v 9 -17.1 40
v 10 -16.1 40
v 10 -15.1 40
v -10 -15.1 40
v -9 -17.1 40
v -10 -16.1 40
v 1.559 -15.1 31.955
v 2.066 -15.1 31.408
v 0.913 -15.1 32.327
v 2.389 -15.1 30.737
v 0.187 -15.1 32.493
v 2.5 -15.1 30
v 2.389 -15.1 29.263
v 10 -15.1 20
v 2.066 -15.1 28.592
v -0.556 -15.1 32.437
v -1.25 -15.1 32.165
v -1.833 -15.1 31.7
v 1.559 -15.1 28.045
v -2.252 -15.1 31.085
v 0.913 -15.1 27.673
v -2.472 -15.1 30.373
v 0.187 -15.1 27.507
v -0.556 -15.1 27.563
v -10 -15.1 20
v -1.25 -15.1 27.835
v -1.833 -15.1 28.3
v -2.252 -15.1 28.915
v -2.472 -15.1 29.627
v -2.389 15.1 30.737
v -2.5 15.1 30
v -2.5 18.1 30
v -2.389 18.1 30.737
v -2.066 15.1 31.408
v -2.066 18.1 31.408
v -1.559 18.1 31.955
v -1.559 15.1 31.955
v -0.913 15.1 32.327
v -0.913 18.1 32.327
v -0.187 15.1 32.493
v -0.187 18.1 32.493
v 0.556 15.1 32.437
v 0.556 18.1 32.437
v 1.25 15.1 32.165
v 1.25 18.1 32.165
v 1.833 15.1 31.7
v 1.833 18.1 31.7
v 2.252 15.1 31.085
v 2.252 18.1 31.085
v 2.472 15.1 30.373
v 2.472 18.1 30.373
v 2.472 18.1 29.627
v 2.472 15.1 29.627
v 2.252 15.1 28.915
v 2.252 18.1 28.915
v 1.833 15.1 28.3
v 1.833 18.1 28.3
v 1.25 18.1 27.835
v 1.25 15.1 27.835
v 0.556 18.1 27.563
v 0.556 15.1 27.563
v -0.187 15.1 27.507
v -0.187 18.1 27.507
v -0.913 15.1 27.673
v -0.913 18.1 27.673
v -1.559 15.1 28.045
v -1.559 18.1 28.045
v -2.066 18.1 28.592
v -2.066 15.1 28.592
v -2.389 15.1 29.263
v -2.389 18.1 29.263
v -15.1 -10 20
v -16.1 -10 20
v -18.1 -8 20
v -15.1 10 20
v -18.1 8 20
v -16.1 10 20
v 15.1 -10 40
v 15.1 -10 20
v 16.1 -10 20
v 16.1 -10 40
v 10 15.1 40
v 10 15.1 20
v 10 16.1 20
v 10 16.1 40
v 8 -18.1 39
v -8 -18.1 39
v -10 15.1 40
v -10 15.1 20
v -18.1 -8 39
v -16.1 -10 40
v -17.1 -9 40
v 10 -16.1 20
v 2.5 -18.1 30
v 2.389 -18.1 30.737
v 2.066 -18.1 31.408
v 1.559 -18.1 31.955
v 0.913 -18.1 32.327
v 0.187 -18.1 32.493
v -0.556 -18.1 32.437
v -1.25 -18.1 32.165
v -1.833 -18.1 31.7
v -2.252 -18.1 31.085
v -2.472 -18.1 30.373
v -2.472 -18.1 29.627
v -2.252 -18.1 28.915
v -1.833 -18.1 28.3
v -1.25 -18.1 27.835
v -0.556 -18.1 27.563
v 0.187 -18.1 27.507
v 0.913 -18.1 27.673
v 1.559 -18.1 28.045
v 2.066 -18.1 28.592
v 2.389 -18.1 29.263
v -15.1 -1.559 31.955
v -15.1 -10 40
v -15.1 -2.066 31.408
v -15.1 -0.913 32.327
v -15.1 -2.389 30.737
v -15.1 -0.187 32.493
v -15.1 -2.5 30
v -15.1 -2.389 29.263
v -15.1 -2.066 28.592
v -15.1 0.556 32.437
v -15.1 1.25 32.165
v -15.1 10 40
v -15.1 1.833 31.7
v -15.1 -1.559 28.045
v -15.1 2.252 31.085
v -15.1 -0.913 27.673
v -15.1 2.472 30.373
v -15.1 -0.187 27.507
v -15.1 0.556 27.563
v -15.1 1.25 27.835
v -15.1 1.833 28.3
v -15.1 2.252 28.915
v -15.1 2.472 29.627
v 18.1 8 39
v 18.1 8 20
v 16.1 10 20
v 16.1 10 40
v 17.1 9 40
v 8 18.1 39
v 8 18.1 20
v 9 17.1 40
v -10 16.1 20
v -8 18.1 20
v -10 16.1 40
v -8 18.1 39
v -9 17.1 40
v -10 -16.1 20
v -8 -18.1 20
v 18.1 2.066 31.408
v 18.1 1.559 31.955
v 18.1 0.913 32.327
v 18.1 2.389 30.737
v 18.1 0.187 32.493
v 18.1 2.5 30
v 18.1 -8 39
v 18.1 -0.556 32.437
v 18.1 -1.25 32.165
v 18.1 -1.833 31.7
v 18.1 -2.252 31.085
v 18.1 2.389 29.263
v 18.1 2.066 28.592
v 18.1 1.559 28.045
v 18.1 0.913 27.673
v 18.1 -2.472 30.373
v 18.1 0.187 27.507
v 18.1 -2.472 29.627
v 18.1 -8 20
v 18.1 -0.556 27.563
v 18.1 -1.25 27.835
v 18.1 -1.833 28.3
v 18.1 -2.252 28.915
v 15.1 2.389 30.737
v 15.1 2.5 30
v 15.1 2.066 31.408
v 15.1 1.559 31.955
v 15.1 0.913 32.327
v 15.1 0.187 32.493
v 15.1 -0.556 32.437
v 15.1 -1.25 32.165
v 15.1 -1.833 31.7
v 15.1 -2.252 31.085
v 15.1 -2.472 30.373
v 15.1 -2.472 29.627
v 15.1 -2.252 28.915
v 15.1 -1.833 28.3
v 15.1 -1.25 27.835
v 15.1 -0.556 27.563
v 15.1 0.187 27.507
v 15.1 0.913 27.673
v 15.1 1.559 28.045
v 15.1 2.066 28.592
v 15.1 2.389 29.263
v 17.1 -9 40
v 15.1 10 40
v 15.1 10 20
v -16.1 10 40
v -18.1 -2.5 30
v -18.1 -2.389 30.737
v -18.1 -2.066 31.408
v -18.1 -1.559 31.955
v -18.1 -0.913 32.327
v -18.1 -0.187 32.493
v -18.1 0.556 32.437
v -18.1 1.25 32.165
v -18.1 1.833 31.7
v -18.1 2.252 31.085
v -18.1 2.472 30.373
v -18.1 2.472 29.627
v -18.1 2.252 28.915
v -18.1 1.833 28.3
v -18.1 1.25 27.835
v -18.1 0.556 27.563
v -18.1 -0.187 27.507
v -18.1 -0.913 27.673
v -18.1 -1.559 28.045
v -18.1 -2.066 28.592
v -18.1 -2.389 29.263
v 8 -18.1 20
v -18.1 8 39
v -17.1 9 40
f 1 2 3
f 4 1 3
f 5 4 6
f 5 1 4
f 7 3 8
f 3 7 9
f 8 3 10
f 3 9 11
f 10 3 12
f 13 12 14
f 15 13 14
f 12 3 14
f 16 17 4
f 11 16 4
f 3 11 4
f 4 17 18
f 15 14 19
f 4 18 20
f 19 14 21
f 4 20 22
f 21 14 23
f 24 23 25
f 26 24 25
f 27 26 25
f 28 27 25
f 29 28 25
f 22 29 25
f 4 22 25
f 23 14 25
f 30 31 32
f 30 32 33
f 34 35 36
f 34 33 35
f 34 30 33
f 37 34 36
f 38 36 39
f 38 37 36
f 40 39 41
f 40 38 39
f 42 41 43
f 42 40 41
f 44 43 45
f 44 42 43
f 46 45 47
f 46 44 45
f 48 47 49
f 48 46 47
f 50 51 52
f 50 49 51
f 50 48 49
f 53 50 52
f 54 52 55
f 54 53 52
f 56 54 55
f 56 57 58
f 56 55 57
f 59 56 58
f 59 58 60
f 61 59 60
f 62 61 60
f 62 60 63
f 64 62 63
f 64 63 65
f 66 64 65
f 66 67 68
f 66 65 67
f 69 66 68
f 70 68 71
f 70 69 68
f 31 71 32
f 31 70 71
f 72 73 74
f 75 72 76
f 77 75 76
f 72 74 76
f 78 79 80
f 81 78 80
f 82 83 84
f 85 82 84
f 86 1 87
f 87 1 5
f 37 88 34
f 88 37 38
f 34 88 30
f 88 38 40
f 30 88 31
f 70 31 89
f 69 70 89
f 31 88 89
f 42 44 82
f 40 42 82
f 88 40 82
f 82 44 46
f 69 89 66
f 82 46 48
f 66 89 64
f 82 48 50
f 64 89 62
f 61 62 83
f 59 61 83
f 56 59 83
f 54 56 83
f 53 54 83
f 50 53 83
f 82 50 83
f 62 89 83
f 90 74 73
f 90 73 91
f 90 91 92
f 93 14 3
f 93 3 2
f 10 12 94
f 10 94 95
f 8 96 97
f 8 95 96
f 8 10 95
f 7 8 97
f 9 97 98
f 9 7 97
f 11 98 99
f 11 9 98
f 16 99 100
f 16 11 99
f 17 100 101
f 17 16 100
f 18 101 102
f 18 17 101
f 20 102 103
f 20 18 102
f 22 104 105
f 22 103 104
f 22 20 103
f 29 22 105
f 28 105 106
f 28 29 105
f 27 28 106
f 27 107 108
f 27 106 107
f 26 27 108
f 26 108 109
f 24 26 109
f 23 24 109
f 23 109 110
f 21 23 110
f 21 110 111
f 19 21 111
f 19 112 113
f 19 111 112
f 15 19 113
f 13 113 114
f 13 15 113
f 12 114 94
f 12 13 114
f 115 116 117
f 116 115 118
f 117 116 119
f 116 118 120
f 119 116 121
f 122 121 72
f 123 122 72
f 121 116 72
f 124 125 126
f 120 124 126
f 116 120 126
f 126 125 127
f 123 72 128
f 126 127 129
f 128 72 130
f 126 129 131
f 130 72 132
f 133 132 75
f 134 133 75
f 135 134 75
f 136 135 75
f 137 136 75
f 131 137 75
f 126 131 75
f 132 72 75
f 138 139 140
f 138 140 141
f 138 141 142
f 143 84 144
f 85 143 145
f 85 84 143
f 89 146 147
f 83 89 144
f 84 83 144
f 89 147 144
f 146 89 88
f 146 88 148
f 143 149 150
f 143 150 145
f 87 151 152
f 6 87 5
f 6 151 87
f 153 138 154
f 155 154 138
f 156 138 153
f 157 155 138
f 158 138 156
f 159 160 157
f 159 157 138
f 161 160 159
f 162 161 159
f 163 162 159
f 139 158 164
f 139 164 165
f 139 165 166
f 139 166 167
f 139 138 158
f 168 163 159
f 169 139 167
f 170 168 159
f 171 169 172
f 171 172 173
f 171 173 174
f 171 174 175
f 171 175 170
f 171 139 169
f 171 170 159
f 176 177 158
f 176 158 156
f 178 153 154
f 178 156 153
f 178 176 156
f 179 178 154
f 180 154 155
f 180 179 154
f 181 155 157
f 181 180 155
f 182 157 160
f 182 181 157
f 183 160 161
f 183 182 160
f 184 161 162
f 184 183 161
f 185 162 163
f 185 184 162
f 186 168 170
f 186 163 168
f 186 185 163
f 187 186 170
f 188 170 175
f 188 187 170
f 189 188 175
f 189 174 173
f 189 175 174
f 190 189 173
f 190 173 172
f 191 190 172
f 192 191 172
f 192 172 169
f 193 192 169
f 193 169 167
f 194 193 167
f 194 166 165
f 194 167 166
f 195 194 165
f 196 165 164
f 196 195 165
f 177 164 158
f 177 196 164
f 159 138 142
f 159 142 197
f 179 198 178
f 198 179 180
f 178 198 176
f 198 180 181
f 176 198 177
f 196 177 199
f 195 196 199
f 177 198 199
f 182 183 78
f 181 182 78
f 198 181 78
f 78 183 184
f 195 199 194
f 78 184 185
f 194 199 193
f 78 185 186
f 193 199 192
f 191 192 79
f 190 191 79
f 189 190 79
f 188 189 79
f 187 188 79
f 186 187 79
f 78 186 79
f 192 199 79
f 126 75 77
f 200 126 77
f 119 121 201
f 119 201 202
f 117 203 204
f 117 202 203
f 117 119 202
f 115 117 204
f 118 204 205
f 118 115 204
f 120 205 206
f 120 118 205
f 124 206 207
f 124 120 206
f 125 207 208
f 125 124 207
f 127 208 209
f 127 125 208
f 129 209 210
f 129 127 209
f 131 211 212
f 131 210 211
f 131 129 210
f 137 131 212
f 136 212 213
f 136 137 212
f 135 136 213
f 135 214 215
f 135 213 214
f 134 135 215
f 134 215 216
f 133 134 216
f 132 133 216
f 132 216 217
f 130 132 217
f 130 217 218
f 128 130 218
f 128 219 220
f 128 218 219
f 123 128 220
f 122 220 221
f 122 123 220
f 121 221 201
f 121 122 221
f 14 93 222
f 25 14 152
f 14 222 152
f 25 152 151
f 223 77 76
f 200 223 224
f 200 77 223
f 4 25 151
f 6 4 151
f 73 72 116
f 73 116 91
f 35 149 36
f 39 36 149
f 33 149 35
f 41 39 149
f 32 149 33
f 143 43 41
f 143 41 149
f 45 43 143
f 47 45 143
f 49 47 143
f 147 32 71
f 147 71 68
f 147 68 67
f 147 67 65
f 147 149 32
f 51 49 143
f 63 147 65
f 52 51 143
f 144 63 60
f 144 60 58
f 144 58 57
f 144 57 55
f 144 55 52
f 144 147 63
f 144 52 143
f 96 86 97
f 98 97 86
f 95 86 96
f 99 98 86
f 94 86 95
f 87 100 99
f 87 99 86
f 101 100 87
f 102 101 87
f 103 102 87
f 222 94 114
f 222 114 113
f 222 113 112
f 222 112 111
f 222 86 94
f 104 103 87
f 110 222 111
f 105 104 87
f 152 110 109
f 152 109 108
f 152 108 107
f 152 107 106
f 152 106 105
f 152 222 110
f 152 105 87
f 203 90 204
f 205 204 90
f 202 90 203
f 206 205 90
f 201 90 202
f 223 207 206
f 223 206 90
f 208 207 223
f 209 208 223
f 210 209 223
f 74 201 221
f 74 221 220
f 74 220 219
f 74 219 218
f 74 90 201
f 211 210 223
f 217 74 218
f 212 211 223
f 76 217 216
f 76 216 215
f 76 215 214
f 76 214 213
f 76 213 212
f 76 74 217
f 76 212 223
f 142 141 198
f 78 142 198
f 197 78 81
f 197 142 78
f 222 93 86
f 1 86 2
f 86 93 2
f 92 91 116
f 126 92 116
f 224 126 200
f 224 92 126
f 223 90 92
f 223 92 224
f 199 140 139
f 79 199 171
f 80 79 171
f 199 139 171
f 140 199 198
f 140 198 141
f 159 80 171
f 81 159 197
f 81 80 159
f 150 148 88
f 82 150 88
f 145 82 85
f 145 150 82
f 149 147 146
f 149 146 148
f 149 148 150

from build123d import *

# Parameters (mm, degrees)
CYLINDER002_R               = 2.5
CYLINDER002_DEPTH           = 10
CYLINDER003_R               = 2.5
CYLINDER003_DEPTH           = 10
CYLINDER003_ROLL_ANGLE      = 90
CYLINDER003_PLACEMENT_ANGLE = 180
CYLINDER004_R               = 2.5
CYLINDER004_DEPTH           = 10
CYLINDER004_ROLL_ANGLE      = 90
CYLINDER004_PITCH_ANGLE     = 0
CYLINDER004_PLACEMENT_ANGLE = -90
CYLINDER001_R               = 2.5
CYLINDER001_DEPTH           = 10
BOX002_W                    = 20
BOX002_H                    = 3
BOX002_DEPTH                = 20
BOX003_W                    = 20
BOX003_H                    = 3
BOX003_DEPTH                = 20
BOX004_W                    = 20
BOX004_H                    = 3
BOX004_DEPTH                = 20
BOX001_W                    = 20
BOX001_H                    = 3
BOX001_DEPTH                = 20
CHAMFER002_SIZE             = 2
CHAMFER003_SIZE             = 2
CHAMFER004_SIZE             = 1


with BuildPart() as v_lec002:
    # Cylinder002 → Cylinder002 (new body)
    with BuildSketch(Plane(origin=(12, 0, 30), x_dir=(0, 1, 0), z_dir=(1, 0, 0))):
        Circle(CYLINDER002_R)
    extrude(amount=CYLINDER002_DEPTH)


with BuildPart() as v_lec003:
    # Cylinder003 → Cylinder003 (new body)
    with BuildSketch(Plane.XY):
        Circle(CYLINDER003_R)
    extrude(amount=CYLINDER003_DEPTH)


with BuildPart() as v_lec003_1:
    # Cylinder003 roll: moved
    add(v_lec003.part.rotate(Axis((0, 0, 0), (1, 0, 0)), CYLINDER003_ROLL_ANGLE))


with BuildPart() as v_lec003_2:
    # Cylinder003 placement: moved
    add(v_lec003_1.part.moved(Location((0, 12, 30))).rotate(Axis((0, 12, 30), (0, 0, 1)), CYLINDER003_PLACEMENT_ANGLE))


with BuildPart() as v_lec004:
    # Cylinder004 → Cylinder004 (new body)
    with BuildSketch(Plane.XY):
        Circle(CYLINDER004_R)
    extrude(amount=CYLINDER004_DEPTH)


with BuildPart() as v_lec004_1:
    # Cylinder004 roll: moved
    add(v_lec004.part.rotate(Axis((0, 0, 0), (1, 0, 0)), CYLINDER004_ROLL_ANGLE))


with BuildPart() as v_lec004_2:
    # Cylinder004 pitch: moved
    add(v_lec004_1.part.rotate(Axis((0, 0, 0), (0, 1, 0)), CYLINDER004_PITCH_ANGLE))


with BuildPart() as v_lec004_3:
    # Cylinder004 placement: moved
    add(v_lec004_2.part.moved(Location((-12, 0, 30))).rotate(Axis((-12, 0, 30), (0, 0, 1)), CYLINDER004_PLACEMENT_ANGLE))


with BuildPart() as compound001:
    # Cylinder001 → Cylinder001 (new body)
    with BuildSketch(Plane(origin=(0, -12, 30), x_dir=(1, 0, 0), z_dir=(0, -1, 0))):
        Circle(CYLINDER001_R)
    extrude(amount=CYLINDER001_DEPTH)

    # Compound001: union Válec002, Válec003, Válec004
    add(v_lec002.part)
    add(v_lec003_2.part)
    add(v_lec004_3.part)


with BuildPart() as krychle002:
    # Box002 → Box002 (new body)
    with BuildSketch(Plane(origin=(-15.1, -10, 20), x_dir=(0, 1, 0), z_dir=(0, 0, 1))):
        with Locations((10, 1.5)):
            Rectangle(BOX002_W, BOX002_H)
    extrude(amount=BOX002_DEPTH)


with BuildPart() as krychle003:
    # Box003 → Box003 (new body)
    with BuildSketch(Plane(origin=(10, -15.1, 20), x_dir=(-1, 0, 0), z_dir=(0, 0, 1))):
        with Locations((10, 1.5)):
            Rectangle(BOX003_W, BOX003_H)
    extrude(amount=BOX003_DEPTH)


with BuildPart() as krychle004:
    # Box004 → Box004 (new body)
    with BuildSketch(Plane(origin=(15.1, 10, 20), x_dir=(0, -1, 0), z_dir=(0, 0, 1))):
        with Locations((10, 1.5)):
            Rectangle(BOX004_W, BOX004_H)
    extrude(amount=BOX004_DEPTH)


with BuildPart() as chamfer004:
    # Box001 → Box001 (new body)
    with BuildSketch(Plane(origin=(-10, 15.1, 20), x_dir=(1, 0, 0), z_dir=(0, 0, 1))):
        with Locations((10, 1.5)):
            Rectangle(BOX001_W, BOX001_H)
    extrude(amount=BOX001_DEPTH)

    # Compound725: union Krychle002, Krychle003, Krychle004
    add(krychle002.part)
    add(krychle003.part)
    add(krychle004.part)

    # Cut001: cut Compound001
    add(compound001.part, mode=Mode.SUBTRACT)

    # Chamfer002
    chamfer002_edges = [chamfer004.edges().sort_by_distance(p)[0] for p in [
        (-10, 18.1, 30),
        (10, 18.1, 30),
        (-18.1, -10, 30),
        (-18.1, 10, 30),
        (-10, -18.1, 30),
    ]]
    chamfer(chamfer002_edges, length=CHAMFER002_SIZE)

    # Chamfer003
    chamfer003_edges = [chamfer004.edges().sort_by_distance(p)[0] for p in [
        (10, -18.1, 30),
        (18.1, 10, 30),
        (18.1, -10, 30),
    ]]
    chamfer(chamfer003_edges, length=CHAMFER003_SIZE)

    # Chamfer004
    chamfer004_edges = [chamfer004.edges().sort_by_distance(p)[0] for p in [
        (0, -18.1, 40),
        (18.1, 0, 40),
        (0, 18.1, 40),
        (-18.1, 0, 40),
    ]]
    chamfer(chamfer004_edges, length=CHAMFER004_SIZE)


solid = chamfer004.part
